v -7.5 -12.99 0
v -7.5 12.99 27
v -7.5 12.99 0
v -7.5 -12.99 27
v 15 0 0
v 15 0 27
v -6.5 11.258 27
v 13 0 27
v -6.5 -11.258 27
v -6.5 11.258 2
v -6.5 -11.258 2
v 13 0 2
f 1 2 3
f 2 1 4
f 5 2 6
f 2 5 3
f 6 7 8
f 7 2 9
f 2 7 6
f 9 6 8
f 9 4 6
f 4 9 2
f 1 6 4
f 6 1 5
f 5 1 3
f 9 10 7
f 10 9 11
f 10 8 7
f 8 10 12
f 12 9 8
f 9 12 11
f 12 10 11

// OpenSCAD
difference(){
cylinder(h=27,r1=15,r2=15,$fn=3);
    translate([0,0,2])
    cylinder(h=25.5,r1=13,r2=13,$fn=3);
}
